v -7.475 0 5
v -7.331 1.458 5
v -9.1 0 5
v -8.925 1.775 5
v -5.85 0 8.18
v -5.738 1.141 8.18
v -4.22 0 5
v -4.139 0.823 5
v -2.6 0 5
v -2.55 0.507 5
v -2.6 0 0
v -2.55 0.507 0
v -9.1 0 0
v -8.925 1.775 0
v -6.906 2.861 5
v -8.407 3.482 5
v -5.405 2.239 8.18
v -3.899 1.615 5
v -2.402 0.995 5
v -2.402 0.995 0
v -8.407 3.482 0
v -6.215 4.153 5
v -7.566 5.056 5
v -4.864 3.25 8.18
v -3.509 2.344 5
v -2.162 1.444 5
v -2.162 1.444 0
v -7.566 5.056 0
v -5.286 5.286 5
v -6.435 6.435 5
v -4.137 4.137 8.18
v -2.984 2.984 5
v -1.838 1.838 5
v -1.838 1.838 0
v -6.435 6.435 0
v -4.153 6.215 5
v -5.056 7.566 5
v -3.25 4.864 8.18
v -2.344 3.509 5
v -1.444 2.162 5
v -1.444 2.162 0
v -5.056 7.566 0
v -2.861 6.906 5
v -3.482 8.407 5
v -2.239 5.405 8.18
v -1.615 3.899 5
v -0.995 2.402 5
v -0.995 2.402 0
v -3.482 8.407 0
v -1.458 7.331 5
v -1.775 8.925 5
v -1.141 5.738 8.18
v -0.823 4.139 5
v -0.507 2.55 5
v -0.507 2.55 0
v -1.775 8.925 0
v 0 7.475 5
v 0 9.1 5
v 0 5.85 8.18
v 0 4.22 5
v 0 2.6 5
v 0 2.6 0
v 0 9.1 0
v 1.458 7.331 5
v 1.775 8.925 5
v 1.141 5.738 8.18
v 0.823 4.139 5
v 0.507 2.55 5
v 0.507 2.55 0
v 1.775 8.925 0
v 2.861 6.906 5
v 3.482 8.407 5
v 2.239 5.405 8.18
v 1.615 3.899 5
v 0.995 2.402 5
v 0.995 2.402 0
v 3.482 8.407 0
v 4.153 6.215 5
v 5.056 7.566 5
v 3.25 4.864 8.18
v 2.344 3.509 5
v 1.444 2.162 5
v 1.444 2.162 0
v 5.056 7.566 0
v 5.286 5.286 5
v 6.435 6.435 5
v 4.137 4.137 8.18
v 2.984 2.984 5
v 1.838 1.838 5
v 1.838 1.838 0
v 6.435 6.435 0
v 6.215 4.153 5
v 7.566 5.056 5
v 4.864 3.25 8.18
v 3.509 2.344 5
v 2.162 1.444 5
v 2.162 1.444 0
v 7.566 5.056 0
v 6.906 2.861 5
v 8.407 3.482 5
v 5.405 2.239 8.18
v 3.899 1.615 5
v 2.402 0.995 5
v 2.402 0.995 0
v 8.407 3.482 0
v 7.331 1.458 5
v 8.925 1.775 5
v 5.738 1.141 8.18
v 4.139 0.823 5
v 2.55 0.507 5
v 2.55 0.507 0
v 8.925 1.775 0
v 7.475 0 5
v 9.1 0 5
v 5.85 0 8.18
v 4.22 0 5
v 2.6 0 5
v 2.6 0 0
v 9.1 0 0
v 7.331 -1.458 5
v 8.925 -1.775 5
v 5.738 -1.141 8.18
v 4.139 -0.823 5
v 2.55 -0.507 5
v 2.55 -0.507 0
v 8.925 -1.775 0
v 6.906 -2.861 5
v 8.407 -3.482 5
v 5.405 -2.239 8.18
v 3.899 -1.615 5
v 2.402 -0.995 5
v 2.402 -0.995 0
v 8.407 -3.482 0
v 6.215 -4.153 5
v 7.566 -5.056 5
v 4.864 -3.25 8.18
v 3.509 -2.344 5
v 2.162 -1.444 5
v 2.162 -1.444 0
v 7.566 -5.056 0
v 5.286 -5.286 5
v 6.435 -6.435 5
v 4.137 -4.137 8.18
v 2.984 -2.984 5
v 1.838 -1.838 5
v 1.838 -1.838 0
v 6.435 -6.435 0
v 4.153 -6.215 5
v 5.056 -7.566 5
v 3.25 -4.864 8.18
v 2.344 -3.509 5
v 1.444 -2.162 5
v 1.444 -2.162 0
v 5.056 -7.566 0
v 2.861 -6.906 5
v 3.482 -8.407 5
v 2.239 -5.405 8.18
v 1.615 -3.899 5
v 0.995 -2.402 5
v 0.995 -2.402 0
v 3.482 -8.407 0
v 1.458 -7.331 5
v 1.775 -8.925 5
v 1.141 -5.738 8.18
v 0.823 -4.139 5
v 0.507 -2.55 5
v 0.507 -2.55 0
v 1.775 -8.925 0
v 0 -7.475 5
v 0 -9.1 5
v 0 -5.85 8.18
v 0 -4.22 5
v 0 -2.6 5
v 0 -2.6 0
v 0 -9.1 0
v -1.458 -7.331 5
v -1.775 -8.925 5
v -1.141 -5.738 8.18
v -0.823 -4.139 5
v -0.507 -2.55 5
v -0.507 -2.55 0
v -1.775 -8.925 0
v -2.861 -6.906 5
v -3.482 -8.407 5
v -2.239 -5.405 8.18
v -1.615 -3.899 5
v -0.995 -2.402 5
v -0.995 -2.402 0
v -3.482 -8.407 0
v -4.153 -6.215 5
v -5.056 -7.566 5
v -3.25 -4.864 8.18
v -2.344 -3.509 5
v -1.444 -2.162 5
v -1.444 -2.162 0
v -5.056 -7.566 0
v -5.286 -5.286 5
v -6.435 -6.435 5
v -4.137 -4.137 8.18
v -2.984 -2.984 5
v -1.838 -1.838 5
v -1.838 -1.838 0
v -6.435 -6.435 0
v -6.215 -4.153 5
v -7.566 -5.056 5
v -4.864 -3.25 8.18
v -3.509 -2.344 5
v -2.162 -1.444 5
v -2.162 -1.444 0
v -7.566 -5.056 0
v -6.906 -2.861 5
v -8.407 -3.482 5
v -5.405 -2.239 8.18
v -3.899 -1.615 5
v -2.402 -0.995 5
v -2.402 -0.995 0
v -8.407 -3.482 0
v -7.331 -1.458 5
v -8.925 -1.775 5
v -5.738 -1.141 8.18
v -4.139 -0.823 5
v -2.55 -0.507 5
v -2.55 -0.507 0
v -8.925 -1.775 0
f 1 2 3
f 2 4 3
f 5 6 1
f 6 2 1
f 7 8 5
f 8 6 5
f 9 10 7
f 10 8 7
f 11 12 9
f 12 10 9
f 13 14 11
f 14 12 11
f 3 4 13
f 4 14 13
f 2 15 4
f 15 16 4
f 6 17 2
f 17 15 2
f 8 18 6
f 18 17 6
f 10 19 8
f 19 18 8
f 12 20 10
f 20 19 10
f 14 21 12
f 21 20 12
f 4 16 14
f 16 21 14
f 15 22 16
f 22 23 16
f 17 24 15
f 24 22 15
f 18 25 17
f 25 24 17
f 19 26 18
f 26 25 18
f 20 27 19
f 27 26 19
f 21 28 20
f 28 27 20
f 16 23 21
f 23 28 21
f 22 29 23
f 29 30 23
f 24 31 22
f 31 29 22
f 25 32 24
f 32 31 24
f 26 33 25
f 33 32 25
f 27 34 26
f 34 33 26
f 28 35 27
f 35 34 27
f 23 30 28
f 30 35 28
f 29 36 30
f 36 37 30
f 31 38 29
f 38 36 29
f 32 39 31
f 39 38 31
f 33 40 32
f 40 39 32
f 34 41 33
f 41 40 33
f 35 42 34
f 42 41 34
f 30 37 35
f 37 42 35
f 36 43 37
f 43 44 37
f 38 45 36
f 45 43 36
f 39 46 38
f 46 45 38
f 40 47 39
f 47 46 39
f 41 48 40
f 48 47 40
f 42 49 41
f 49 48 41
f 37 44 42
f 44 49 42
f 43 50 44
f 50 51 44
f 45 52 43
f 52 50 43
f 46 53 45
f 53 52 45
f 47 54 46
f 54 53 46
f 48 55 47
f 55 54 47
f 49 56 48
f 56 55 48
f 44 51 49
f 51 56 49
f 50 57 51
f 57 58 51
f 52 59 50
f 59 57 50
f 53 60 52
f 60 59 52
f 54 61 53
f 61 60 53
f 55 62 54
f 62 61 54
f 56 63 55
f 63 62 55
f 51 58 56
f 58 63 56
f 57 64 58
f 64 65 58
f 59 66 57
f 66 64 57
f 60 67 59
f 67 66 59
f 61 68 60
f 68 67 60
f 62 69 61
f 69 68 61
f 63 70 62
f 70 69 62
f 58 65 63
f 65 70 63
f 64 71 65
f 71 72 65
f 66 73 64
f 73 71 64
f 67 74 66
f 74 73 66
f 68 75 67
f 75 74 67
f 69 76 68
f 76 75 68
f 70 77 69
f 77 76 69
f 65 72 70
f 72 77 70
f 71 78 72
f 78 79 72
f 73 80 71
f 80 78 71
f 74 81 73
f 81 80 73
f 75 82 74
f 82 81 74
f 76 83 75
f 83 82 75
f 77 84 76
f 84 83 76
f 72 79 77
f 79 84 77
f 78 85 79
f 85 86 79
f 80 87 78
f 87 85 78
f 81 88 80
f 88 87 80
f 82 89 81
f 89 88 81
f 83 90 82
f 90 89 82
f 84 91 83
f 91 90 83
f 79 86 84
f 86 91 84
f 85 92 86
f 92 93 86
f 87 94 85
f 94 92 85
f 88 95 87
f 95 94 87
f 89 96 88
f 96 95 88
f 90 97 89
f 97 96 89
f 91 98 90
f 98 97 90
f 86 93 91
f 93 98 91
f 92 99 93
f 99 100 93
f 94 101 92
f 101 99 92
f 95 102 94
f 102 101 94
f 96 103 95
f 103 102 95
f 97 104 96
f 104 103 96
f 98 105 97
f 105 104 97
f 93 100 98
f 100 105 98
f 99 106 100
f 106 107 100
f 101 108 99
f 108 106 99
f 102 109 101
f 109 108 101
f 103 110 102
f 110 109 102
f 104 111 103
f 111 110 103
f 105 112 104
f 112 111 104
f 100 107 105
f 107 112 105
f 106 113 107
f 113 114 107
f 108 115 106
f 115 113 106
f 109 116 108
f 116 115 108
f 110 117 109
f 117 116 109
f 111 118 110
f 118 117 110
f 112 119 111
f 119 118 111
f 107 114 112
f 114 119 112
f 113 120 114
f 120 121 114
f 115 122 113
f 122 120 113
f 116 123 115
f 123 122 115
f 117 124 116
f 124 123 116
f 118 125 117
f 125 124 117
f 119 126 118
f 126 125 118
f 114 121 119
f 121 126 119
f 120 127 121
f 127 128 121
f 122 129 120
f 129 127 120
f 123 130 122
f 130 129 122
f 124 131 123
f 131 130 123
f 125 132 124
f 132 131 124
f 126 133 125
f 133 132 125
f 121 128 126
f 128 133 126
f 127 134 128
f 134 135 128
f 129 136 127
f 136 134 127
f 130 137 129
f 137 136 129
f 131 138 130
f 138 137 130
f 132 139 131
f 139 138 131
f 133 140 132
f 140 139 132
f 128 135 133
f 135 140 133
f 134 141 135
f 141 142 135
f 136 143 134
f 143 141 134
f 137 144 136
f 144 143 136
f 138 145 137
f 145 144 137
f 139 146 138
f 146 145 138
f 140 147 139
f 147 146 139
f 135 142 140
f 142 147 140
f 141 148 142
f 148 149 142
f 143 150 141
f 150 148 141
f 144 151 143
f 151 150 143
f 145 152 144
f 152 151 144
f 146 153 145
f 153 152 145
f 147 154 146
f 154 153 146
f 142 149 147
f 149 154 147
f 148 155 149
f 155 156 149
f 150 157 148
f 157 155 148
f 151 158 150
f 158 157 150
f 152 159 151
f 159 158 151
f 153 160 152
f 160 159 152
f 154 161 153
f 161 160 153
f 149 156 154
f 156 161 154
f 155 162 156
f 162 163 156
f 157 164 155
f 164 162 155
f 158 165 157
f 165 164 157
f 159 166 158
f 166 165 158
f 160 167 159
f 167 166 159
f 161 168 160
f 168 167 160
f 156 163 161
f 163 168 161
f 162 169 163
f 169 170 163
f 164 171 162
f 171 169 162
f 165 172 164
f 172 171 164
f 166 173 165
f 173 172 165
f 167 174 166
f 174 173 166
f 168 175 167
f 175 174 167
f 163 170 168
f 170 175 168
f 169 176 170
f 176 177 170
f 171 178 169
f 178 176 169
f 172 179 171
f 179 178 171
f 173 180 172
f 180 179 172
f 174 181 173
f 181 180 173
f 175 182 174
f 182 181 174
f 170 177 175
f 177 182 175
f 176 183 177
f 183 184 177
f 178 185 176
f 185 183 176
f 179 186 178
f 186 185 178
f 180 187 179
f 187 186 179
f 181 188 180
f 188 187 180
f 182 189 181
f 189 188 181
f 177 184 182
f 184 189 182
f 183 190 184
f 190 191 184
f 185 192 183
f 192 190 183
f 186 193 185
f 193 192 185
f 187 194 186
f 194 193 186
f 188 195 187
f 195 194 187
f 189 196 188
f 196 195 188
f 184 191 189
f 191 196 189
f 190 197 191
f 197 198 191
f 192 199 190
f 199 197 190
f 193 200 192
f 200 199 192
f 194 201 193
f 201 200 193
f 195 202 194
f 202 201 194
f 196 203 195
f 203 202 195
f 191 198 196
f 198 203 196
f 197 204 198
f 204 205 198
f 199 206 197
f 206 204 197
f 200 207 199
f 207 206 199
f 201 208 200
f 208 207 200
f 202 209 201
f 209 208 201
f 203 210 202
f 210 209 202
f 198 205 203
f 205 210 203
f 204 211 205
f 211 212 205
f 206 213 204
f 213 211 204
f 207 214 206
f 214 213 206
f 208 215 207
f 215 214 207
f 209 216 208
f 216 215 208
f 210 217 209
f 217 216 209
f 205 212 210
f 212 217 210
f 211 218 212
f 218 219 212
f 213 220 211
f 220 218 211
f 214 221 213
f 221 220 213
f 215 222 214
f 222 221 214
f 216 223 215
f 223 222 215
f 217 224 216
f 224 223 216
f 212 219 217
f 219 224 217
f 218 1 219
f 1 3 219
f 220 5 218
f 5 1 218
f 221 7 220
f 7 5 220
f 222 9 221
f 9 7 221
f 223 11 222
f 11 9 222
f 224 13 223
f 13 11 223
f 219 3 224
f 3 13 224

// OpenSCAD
$fn = 32;

// ----------------------------------------------------------------------
// Form washer: domed washer, 18.2 mm outside, 5.2 mm bore
// ----------------------------------------------------------------------

// --- parameters (mm) ---
revolve_angle = 360;      // full turn around the Z axis
profile_points = 7;       // points of the closed outline

profile = [[2.6, 0], [9.1, 0], [9.1, 5], [7.475, 5], [5.85, 8.18], [4.22, 5], [2.6, 5]];  // single closed polygon, 7 points, counter clockwise

// --- the one profile operation ---
rotate_extrude(angle = revolve_angle) polygon(points = profile);
